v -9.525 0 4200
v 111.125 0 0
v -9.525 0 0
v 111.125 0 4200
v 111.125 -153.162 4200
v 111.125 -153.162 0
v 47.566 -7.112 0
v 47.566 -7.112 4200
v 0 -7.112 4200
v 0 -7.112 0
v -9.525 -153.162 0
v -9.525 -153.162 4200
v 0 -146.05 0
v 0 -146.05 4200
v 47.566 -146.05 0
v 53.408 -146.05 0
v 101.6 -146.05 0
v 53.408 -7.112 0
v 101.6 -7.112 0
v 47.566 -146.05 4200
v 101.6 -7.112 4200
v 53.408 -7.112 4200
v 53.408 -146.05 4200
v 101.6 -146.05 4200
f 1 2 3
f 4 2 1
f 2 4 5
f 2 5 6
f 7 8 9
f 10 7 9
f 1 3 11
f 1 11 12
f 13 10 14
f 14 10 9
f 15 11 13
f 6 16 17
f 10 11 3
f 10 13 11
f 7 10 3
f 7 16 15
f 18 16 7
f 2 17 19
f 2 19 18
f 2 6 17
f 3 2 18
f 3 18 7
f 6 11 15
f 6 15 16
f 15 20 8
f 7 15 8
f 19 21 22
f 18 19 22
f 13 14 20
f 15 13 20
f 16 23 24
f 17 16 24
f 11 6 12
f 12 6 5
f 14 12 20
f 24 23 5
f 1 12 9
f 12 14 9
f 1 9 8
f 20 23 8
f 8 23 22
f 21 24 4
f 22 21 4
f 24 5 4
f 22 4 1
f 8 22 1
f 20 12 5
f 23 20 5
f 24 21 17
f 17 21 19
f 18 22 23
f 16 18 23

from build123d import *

# Parameters (mm, degrees)
BOSS_EXTRUDE1_DEPTH = 4200
SKETCH3_W           = 4200
SKETCH3_H           = 153.162
BOSS_EXTRUDE2_DEPTH = 9.525
SKETCH4_W           = 4200
SKETCH4_H           = 153.162
BOSS_EXTRUDE3_DEPTH = 9.525


with BuildPart() as part:
    # Sketch1 → Boss-Extrude1 (new body)
    with BuildSketch(Plane.XY):
        Polygon((0, -0.000240533), (101.6, -0.000240533), (101.6, -7.112240533), (53.408035714, -7.112240533), (53.408035714, -146.050240533), (101.6, -146.050240533), (101.6, -153.162240533), (0, -153.162240533), (0, -146.050240533), (47.566035714, -146.050240533), (47.566035714, -7.112240533), (0, -7.112240533), align=None)
    extrude(amount=BOSS_EXTRUDE1_DEPTH)

    # Sketch3 → Boss-Extrude2 (add)
    with BuildSketch(Plane(origin=(101.6, 0, 0), x_dir=(0, 0, -1), z_dir=(1, 0, 0))):
        with Locations((-2100, -76.581240533)):
            Rectangle(SKETCH3_W, SKETCH3_H)
    extrude(amount=BOSS_EXTRUDE2_DEPTH)

    # Sketch4 → Boss-Extrude3 (add)
    with BuildSketch(Plane.ZY):
        with Locations((2100, -76.581240533)):
            Rectangle(SKETCH4_W, SKETCH4_H)
    extrude(amount=BOSS_EXTRUDE3_DEPTH)


solid = part.part
